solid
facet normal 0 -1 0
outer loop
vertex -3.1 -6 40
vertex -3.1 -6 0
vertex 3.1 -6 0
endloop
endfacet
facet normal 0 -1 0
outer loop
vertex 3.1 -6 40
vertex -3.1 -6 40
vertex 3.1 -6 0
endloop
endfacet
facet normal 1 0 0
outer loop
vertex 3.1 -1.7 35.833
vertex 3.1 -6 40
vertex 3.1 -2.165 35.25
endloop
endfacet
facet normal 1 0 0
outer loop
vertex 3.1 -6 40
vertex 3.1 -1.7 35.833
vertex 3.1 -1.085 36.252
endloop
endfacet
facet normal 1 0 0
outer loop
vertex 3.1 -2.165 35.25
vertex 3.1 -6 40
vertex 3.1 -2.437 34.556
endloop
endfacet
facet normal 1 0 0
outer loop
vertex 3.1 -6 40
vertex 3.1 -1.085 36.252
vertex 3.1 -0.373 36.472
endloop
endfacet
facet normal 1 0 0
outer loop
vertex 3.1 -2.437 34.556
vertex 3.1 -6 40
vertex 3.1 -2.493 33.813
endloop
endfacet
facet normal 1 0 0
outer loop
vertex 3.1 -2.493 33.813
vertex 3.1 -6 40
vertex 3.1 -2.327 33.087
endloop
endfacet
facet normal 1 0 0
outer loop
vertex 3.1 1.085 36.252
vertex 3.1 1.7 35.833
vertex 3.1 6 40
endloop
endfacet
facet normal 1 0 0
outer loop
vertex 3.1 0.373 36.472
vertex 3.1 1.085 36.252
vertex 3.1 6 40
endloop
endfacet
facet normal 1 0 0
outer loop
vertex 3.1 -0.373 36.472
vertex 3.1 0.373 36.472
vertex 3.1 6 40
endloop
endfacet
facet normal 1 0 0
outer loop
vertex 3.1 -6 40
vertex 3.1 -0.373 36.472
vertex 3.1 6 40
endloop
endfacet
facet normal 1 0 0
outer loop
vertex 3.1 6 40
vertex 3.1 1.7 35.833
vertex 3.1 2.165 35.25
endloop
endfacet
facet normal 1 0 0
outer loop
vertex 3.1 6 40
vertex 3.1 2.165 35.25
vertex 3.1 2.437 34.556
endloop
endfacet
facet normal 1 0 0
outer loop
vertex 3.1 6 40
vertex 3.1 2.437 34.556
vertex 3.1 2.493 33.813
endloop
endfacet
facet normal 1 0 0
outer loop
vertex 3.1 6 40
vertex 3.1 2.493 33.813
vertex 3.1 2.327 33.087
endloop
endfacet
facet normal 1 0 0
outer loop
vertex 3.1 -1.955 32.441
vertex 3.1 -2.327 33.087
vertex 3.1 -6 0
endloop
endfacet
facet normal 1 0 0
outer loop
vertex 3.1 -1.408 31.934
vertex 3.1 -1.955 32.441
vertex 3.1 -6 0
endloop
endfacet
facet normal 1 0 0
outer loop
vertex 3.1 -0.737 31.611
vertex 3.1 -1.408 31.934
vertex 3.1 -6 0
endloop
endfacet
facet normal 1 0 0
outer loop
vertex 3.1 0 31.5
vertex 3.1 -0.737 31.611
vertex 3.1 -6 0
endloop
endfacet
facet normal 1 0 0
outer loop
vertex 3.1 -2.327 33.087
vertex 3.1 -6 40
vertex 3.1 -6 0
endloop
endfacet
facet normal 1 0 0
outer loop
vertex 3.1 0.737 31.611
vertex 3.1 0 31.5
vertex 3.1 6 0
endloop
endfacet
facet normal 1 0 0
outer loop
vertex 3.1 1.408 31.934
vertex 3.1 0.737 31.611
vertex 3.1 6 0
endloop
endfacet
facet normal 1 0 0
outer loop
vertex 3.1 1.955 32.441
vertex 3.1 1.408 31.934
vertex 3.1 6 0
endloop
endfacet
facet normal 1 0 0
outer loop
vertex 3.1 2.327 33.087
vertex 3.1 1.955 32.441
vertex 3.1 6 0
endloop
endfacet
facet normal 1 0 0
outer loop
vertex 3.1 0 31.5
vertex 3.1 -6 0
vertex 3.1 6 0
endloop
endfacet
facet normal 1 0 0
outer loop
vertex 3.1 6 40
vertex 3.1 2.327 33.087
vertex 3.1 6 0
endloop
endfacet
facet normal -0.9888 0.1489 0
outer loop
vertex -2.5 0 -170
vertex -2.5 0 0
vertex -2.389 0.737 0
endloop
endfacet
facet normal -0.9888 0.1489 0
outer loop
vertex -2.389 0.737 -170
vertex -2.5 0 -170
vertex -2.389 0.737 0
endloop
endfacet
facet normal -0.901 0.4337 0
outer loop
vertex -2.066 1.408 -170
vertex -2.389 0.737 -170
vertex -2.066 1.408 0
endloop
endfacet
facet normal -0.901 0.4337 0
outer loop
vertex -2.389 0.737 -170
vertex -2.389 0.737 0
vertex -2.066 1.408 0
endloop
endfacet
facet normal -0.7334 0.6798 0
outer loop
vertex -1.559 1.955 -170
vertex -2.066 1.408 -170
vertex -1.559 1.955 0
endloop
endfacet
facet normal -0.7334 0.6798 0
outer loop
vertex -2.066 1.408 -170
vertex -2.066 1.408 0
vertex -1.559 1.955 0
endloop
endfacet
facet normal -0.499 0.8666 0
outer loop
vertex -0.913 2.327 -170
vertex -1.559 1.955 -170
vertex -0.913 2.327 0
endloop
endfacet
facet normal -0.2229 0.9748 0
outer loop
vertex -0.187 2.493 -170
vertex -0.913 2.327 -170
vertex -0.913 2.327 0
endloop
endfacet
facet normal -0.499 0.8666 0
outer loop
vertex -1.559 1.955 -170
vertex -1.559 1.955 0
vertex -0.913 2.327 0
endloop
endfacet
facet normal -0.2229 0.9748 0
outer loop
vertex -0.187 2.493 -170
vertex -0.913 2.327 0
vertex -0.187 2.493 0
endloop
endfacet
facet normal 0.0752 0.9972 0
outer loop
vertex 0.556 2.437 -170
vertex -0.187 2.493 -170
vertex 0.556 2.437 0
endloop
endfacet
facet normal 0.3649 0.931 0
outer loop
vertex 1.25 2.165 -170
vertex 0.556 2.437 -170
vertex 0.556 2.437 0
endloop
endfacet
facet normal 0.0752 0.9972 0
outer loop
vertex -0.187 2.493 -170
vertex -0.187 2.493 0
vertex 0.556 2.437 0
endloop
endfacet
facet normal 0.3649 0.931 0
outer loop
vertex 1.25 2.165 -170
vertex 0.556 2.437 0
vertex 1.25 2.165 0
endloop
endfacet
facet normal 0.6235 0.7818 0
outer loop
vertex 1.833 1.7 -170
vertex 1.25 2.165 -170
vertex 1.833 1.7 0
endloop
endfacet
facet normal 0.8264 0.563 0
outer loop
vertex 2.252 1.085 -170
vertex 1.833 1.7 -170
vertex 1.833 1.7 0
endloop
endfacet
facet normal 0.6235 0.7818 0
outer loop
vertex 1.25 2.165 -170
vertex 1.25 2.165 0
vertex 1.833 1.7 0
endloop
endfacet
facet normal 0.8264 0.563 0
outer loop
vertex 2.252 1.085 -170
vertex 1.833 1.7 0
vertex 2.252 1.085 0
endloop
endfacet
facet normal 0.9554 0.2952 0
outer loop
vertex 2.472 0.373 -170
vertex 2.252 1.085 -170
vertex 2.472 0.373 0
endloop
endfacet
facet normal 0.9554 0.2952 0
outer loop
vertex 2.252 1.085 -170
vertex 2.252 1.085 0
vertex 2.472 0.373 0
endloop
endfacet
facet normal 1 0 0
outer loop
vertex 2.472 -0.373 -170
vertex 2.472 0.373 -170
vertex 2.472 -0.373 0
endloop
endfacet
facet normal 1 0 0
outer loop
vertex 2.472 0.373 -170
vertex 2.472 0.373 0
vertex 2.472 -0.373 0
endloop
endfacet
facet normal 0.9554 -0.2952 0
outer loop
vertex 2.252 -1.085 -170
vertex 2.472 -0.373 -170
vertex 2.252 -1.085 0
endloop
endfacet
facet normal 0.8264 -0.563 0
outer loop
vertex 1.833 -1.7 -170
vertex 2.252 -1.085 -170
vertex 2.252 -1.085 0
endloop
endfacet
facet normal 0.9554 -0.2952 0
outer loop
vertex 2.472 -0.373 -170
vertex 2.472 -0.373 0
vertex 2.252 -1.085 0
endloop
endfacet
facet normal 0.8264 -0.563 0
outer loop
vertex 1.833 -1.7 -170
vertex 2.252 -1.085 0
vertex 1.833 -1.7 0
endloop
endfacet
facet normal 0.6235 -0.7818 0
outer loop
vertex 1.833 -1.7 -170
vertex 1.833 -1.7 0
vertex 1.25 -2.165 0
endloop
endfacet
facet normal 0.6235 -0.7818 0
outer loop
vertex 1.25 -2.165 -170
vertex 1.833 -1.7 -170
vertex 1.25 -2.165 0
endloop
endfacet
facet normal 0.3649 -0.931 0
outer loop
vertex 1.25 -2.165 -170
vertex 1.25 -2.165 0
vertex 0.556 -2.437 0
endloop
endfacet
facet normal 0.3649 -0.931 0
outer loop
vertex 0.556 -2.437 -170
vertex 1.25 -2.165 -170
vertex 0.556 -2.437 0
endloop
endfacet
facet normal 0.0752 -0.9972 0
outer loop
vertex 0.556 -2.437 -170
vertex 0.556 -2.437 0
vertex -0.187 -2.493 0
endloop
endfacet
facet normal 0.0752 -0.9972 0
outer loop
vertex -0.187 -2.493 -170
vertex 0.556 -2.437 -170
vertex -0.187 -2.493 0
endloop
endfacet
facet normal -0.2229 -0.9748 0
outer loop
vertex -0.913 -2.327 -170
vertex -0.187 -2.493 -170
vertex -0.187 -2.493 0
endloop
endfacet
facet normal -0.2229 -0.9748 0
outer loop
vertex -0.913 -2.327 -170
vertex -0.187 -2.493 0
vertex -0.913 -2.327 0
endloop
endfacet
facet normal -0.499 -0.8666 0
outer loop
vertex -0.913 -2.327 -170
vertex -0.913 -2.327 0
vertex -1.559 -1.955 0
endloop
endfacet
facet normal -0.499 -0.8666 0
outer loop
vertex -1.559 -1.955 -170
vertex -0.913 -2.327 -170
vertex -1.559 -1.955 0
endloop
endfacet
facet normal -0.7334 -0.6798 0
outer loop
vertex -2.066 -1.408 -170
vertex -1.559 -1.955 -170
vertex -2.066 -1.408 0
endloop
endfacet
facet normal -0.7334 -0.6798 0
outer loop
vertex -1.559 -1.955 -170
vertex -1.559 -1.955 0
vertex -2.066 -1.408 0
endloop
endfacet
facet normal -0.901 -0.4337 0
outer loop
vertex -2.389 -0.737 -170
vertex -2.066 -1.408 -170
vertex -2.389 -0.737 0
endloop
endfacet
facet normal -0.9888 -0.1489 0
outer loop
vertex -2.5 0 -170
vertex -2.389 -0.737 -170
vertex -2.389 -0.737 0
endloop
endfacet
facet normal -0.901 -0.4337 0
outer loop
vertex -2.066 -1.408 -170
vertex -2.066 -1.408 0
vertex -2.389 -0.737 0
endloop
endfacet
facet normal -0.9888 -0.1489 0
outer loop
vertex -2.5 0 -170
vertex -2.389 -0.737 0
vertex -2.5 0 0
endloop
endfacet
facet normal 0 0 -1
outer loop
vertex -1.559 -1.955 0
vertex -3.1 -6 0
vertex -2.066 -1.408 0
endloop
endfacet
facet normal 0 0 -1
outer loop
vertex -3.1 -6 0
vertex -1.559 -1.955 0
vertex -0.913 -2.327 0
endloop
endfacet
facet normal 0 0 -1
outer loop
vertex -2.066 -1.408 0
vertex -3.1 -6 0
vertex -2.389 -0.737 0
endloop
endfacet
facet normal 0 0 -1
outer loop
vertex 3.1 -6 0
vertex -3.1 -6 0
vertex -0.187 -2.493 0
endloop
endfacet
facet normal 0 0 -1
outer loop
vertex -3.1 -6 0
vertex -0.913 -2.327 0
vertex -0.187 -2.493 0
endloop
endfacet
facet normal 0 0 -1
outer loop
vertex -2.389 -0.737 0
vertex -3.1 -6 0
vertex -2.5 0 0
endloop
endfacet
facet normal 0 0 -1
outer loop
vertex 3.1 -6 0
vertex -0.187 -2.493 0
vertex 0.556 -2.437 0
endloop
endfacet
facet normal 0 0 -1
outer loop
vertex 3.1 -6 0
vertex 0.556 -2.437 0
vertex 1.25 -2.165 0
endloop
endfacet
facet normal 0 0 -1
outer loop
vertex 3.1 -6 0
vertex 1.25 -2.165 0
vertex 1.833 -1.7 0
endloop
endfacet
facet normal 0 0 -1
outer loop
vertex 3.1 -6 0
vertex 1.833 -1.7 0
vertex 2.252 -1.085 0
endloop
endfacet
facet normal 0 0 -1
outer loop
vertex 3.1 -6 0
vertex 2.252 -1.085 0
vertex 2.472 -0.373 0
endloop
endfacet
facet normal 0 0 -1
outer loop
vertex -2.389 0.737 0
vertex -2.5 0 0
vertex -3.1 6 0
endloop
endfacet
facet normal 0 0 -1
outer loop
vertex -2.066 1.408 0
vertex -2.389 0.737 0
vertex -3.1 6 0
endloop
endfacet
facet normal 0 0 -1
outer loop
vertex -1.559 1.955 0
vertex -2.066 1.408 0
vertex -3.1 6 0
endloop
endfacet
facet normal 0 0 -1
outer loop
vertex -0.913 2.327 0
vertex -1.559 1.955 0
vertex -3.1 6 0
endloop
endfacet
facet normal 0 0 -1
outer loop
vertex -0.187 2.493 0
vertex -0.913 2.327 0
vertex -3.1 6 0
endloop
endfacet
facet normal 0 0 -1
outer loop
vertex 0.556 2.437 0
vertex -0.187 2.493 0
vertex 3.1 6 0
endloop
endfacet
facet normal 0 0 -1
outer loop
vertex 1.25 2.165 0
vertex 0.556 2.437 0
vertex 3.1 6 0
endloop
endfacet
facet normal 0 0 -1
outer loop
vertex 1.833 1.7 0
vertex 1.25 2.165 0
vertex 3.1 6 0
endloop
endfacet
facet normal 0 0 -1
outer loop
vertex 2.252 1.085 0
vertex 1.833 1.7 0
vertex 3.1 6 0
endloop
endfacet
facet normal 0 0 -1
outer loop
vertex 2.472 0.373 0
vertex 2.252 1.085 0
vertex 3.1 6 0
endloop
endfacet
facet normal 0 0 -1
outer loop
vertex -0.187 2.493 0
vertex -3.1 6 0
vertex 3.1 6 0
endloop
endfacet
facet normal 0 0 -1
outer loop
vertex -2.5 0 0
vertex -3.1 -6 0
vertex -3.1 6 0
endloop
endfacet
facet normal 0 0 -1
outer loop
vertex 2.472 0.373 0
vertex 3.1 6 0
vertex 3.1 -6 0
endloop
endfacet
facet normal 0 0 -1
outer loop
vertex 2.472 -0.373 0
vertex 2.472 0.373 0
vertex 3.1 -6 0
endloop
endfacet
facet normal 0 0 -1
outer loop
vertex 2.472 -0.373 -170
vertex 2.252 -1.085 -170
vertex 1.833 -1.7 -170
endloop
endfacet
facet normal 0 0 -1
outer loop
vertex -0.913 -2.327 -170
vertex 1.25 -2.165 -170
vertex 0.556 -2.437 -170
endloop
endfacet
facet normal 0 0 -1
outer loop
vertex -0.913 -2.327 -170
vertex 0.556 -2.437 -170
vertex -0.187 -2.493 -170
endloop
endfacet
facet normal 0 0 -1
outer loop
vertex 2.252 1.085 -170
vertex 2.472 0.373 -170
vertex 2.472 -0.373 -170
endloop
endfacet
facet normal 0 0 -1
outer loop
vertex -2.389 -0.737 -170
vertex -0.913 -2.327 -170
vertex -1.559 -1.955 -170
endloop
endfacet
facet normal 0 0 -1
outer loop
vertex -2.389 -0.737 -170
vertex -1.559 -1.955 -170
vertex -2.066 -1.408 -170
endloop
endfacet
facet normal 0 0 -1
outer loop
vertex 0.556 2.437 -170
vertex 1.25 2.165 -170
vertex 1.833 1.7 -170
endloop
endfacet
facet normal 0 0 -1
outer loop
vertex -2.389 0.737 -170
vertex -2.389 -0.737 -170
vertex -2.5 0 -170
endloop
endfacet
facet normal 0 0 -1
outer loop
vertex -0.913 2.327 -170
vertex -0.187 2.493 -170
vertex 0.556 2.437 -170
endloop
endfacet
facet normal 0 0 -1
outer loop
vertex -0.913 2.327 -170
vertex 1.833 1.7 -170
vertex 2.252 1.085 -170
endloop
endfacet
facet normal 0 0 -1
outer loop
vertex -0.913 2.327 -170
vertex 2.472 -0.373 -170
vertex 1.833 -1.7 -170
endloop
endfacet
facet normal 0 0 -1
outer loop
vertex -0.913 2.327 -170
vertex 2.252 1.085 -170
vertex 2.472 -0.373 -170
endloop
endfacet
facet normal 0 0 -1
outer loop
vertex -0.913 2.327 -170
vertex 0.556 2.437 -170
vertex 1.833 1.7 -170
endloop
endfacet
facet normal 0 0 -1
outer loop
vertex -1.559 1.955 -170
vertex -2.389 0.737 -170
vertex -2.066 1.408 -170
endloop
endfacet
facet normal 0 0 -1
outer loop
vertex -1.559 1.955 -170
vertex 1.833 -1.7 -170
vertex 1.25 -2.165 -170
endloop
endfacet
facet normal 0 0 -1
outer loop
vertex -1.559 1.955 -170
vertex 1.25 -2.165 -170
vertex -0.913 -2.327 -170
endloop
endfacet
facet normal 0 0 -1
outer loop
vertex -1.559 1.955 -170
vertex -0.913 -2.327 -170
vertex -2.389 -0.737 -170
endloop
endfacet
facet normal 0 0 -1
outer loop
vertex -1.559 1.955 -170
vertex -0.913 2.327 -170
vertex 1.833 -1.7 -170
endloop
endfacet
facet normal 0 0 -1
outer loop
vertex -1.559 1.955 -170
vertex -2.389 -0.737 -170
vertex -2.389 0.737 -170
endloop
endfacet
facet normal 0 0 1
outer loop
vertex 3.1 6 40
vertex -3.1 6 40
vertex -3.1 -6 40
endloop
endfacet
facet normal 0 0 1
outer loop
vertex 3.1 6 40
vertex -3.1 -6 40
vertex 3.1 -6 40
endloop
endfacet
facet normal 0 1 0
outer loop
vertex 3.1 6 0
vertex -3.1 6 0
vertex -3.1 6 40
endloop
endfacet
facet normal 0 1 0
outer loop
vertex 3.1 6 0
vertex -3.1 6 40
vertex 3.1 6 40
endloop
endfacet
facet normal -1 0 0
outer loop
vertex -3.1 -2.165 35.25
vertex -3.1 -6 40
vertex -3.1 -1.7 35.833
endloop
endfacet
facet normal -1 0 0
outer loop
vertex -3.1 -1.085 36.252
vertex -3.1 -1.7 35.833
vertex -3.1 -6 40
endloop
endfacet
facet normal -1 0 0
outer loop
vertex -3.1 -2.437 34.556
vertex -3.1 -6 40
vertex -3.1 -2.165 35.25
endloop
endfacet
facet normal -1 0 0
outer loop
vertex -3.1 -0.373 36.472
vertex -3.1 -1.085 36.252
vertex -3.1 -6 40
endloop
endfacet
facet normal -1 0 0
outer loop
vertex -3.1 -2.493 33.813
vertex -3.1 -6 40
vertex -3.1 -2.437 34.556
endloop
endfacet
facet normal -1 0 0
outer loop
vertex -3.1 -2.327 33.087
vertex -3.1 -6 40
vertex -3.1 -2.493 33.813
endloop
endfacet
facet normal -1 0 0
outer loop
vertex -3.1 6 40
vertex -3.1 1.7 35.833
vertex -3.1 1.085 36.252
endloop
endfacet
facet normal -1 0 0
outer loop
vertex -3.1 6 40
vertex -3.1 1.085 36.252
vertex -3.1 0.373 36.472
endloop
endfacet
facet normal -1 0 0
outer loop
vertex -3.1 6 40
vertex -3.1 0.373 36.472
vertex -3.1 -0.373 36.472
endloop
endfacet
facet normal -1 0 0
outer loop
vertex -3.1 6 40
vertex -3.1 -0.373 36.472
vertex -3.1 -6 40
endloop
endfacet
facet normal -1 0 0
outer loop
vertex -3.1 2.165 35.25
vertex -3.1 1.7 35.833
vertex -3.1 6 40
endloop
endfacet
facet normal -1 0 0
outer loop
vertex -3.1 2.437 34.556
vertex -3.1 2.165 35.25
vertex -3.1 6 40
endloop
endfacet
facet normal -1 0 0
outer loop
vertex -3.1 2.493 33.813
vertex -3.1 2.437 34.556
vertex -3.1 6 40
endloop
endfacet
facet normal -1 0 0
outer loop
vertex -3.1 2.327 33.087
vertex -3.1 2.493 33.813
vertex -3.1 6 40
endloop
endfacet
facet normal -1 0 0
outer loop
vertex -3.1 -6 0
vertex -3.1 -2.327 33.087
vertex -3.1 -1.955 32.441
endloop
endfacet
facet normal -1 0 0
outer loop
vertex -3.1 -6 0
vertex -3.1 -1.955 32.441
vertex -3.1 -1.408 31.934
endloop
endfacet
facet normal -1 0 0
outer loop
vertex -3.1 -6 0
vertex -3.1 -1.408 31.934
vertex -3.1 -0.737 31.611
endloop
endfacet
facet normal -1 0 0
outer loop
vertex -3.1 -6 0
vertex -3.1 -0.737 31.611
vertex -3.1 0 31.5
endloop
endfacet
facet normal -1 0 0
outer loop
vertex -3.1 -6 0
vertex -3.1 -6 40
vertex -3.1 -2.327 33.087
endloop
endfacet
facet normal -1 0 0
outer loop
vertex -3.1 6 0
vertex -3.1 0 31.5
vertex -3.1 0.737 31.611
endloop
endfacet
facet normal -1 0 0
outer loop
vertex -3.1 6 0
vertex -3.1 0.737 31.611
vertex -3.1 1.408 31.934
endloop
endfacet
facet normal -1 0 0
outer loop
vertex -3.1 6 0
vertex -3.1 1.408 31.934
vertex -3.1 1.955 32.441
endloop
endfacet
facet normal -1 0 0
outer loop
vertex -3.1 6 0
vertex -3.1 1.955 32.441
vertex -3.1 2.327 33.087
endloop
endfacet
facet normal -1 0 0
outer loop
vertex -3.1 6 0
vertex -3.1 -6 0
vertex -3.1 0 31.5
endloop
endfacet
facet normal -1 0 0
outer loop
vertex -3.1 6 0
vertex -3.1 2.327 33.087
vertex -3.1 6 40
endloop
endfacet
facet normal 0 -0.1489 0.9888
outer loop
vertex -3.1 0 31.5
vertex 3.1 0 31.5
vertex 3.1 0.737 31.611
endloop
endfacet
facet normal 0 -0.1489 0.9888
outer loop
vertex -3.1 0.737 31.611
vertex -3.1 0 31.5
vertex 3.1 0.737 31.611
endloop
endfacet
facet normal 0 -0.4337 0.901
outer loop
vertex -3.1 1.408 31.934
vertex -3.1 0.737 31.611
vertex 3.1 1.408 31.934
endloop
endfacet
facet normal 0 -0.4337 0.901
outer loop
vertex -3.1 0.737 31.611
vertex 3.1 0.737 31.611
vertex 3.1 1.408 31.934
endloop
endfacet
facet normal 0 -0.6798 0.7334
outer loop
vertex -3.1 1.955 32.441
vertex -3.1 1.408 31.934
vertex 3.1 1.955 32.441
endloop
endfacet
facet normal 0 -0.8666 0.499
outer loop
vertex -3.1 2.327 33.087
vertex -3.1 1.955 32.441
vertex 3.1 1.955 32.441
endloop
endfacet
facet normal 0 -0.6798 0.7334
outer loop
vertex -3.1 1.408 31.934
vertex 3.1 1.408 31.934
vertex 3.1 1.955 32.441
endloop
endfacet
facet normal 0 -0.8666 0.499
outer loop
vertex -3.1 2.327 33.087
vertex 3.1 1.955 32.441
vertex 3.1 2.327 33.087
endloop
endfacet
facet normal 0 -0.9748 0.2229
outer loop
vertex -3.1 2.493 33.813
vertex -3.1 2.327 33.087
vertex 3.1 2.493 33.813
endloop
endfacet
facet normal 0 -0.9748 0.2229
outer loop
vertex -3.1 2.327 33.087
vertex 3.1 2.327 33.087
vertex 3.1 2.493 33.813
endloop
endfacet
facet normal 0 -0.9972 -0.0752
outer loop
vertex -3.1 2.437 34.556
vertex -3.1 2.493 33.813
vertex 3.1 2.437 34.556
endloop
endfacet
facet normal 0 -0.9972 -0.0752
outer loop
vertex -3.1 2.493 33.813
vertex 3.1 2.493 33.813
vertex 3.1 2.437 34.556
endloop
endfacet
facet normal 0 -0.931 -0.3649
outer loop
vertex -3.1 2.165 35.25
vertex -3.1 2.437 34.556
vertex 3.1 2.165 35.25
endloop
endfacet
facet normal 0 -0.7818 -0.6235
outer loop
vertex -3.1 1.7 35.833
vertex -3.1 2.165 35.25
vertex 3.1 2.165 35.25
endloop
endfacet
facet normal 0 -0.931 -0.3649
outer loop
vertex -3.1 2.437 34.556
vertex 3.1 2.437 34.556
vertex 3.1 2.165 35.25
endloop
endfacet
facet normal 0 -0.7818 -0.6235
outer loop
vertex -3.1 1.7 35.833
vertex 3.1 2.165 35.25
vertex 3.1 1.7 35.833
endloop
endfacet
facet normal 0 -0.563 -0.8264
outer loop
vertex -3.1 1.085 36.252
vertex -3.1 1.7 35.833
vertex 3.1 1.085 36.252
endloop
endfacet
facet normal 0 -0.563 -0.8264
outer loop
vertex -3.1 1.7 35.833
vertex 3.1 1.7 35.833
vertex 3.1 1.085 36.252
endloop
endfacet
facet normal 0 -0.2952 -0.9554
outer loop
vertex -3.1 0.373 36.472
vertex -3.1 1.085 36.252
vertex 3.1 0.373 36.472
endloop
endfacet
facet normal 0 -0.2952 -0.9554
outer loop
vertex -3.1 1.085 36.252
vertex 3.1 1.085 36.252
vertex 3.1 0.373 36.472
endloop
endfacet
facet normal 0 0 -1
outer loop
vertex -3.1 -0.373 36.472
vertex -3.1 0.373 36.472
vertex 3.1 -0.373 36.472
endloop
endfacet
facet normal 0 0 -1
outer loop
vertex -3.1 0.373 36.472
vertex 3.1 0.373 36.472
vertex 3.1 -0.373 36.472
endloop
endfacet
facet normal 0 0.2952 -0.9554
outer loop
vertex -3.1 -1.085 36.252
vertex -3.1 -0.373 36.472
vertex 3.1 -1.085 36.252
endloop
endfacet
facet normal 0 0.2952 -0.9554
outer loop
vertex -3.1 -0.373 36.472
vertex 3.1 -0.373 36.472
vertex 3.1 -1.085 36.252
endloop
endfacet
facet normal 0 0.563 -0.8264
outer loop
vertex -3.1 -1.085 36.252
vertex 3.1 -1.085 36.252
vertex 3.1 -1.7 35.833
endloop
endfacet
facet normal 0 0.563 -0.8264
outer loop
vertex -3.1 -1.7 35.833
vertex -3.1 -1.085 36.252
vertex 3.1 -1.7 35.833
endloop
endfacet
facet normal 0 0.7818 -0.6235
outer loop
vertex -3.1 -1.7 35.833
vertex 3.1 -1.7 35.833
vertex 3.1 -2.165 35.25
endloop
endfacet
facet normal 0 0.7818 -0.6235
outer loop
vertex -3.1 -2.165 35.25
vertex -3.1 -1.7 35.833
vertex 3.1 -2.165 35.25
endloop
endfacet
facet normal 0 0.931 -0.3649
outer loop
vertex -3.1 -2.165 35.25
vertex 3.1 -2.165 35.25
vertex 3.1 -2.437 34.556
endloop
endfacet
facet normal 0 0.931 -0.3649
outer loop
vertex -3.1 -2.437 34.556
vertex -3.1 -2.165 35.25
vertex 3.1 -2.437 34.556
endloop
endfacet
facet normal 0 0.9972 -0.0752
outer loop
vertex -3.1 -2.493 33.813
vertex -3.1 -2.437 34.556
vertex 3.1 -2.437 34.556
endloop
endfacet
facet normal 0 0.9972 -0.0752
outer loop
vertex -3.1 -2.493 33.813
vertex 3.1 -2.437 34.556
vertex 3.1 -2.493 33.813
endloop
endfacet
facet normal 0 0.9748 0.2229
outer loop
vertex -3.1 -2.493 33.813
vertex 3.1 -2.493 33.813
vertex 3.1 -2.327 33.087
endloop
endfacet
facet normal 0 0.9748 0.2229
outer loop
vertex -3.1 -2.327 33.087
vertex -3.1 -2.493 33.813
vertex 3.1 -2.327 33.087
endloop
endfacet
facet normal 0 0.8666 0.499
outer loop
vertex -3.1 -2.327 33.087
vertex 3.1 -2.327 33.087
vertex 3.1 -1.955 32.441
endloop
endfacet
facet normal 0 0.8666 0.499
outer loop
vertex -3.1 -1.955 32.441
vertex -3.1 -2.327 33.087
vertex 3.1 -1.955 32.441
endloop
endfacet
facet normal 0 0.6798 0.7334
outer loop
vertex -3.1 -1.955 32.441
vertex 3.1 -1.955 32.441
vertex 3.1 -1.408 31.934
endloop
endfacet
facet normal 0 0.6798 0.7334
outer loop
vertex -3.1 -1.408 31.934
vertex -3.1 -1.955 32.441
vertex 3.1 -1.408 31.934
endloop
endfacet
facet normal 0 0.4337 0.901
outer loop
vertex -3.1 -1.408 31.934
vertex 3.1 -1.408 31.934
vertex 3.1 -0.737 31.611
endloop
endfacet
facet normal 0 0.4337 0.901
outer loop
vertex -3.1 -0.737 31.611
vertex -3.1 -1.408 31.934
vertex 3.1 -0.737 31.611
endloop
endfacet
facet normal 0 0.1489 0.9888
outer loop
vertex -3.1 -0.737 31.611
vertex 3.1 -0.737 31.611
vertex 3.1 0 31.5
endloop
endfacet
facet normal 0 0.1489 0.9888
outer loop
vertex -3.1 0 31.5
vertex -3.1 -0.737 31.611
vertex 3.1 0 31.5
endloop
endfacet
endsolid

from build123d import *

# Parameters (mm, degrees)
SKETCH_1_W          = 6.2
SKETCH_1_H          = 12
EXTRUDE_1_DEPTH     = 40
SKETCH_2_R          = 2.5
CUT_EXTRUDE_1_DEPTH = 41.919921799
SKETCH_3_R          = 2.5
EXTRUDE_2_DEPTH     = 170


with BuildPart() as part:
    # 草图1 → 凸台-拉伸1 (new body)
    with BuildSketch(Plane.XY):
        Rectangle(SKETCH_1_W, SKETCH_1_H)
    extrude(amount=EXTRUDE_1_DEPTH)

    # 草图2 → 切除-拉伸1 (cut, through all)
    with BuildSketch(Plane(origin=(3.1, 0, 0), x_dir=(0, 0, -1), z_dir=(1, 0, 0))):
        with Locations((-34, 0)):
            Circle(SKETCH_2_R)
    extrude(amount=-CUT_EXTRUDE_1_DEPTH, mode=Mode.SUBTRACT)

    # 草图3 → 凸台-拉伸2 (add)
    with BuildSketch(Plane(origin=(0, 0, 0), x_dir=(-1, 0, 0), z_dir=(0, 0, -1))):
        Circle(SKETCH_3_R)
    extrude(amount=EXTRUDE_2_DEPTH)


solid = part.part
